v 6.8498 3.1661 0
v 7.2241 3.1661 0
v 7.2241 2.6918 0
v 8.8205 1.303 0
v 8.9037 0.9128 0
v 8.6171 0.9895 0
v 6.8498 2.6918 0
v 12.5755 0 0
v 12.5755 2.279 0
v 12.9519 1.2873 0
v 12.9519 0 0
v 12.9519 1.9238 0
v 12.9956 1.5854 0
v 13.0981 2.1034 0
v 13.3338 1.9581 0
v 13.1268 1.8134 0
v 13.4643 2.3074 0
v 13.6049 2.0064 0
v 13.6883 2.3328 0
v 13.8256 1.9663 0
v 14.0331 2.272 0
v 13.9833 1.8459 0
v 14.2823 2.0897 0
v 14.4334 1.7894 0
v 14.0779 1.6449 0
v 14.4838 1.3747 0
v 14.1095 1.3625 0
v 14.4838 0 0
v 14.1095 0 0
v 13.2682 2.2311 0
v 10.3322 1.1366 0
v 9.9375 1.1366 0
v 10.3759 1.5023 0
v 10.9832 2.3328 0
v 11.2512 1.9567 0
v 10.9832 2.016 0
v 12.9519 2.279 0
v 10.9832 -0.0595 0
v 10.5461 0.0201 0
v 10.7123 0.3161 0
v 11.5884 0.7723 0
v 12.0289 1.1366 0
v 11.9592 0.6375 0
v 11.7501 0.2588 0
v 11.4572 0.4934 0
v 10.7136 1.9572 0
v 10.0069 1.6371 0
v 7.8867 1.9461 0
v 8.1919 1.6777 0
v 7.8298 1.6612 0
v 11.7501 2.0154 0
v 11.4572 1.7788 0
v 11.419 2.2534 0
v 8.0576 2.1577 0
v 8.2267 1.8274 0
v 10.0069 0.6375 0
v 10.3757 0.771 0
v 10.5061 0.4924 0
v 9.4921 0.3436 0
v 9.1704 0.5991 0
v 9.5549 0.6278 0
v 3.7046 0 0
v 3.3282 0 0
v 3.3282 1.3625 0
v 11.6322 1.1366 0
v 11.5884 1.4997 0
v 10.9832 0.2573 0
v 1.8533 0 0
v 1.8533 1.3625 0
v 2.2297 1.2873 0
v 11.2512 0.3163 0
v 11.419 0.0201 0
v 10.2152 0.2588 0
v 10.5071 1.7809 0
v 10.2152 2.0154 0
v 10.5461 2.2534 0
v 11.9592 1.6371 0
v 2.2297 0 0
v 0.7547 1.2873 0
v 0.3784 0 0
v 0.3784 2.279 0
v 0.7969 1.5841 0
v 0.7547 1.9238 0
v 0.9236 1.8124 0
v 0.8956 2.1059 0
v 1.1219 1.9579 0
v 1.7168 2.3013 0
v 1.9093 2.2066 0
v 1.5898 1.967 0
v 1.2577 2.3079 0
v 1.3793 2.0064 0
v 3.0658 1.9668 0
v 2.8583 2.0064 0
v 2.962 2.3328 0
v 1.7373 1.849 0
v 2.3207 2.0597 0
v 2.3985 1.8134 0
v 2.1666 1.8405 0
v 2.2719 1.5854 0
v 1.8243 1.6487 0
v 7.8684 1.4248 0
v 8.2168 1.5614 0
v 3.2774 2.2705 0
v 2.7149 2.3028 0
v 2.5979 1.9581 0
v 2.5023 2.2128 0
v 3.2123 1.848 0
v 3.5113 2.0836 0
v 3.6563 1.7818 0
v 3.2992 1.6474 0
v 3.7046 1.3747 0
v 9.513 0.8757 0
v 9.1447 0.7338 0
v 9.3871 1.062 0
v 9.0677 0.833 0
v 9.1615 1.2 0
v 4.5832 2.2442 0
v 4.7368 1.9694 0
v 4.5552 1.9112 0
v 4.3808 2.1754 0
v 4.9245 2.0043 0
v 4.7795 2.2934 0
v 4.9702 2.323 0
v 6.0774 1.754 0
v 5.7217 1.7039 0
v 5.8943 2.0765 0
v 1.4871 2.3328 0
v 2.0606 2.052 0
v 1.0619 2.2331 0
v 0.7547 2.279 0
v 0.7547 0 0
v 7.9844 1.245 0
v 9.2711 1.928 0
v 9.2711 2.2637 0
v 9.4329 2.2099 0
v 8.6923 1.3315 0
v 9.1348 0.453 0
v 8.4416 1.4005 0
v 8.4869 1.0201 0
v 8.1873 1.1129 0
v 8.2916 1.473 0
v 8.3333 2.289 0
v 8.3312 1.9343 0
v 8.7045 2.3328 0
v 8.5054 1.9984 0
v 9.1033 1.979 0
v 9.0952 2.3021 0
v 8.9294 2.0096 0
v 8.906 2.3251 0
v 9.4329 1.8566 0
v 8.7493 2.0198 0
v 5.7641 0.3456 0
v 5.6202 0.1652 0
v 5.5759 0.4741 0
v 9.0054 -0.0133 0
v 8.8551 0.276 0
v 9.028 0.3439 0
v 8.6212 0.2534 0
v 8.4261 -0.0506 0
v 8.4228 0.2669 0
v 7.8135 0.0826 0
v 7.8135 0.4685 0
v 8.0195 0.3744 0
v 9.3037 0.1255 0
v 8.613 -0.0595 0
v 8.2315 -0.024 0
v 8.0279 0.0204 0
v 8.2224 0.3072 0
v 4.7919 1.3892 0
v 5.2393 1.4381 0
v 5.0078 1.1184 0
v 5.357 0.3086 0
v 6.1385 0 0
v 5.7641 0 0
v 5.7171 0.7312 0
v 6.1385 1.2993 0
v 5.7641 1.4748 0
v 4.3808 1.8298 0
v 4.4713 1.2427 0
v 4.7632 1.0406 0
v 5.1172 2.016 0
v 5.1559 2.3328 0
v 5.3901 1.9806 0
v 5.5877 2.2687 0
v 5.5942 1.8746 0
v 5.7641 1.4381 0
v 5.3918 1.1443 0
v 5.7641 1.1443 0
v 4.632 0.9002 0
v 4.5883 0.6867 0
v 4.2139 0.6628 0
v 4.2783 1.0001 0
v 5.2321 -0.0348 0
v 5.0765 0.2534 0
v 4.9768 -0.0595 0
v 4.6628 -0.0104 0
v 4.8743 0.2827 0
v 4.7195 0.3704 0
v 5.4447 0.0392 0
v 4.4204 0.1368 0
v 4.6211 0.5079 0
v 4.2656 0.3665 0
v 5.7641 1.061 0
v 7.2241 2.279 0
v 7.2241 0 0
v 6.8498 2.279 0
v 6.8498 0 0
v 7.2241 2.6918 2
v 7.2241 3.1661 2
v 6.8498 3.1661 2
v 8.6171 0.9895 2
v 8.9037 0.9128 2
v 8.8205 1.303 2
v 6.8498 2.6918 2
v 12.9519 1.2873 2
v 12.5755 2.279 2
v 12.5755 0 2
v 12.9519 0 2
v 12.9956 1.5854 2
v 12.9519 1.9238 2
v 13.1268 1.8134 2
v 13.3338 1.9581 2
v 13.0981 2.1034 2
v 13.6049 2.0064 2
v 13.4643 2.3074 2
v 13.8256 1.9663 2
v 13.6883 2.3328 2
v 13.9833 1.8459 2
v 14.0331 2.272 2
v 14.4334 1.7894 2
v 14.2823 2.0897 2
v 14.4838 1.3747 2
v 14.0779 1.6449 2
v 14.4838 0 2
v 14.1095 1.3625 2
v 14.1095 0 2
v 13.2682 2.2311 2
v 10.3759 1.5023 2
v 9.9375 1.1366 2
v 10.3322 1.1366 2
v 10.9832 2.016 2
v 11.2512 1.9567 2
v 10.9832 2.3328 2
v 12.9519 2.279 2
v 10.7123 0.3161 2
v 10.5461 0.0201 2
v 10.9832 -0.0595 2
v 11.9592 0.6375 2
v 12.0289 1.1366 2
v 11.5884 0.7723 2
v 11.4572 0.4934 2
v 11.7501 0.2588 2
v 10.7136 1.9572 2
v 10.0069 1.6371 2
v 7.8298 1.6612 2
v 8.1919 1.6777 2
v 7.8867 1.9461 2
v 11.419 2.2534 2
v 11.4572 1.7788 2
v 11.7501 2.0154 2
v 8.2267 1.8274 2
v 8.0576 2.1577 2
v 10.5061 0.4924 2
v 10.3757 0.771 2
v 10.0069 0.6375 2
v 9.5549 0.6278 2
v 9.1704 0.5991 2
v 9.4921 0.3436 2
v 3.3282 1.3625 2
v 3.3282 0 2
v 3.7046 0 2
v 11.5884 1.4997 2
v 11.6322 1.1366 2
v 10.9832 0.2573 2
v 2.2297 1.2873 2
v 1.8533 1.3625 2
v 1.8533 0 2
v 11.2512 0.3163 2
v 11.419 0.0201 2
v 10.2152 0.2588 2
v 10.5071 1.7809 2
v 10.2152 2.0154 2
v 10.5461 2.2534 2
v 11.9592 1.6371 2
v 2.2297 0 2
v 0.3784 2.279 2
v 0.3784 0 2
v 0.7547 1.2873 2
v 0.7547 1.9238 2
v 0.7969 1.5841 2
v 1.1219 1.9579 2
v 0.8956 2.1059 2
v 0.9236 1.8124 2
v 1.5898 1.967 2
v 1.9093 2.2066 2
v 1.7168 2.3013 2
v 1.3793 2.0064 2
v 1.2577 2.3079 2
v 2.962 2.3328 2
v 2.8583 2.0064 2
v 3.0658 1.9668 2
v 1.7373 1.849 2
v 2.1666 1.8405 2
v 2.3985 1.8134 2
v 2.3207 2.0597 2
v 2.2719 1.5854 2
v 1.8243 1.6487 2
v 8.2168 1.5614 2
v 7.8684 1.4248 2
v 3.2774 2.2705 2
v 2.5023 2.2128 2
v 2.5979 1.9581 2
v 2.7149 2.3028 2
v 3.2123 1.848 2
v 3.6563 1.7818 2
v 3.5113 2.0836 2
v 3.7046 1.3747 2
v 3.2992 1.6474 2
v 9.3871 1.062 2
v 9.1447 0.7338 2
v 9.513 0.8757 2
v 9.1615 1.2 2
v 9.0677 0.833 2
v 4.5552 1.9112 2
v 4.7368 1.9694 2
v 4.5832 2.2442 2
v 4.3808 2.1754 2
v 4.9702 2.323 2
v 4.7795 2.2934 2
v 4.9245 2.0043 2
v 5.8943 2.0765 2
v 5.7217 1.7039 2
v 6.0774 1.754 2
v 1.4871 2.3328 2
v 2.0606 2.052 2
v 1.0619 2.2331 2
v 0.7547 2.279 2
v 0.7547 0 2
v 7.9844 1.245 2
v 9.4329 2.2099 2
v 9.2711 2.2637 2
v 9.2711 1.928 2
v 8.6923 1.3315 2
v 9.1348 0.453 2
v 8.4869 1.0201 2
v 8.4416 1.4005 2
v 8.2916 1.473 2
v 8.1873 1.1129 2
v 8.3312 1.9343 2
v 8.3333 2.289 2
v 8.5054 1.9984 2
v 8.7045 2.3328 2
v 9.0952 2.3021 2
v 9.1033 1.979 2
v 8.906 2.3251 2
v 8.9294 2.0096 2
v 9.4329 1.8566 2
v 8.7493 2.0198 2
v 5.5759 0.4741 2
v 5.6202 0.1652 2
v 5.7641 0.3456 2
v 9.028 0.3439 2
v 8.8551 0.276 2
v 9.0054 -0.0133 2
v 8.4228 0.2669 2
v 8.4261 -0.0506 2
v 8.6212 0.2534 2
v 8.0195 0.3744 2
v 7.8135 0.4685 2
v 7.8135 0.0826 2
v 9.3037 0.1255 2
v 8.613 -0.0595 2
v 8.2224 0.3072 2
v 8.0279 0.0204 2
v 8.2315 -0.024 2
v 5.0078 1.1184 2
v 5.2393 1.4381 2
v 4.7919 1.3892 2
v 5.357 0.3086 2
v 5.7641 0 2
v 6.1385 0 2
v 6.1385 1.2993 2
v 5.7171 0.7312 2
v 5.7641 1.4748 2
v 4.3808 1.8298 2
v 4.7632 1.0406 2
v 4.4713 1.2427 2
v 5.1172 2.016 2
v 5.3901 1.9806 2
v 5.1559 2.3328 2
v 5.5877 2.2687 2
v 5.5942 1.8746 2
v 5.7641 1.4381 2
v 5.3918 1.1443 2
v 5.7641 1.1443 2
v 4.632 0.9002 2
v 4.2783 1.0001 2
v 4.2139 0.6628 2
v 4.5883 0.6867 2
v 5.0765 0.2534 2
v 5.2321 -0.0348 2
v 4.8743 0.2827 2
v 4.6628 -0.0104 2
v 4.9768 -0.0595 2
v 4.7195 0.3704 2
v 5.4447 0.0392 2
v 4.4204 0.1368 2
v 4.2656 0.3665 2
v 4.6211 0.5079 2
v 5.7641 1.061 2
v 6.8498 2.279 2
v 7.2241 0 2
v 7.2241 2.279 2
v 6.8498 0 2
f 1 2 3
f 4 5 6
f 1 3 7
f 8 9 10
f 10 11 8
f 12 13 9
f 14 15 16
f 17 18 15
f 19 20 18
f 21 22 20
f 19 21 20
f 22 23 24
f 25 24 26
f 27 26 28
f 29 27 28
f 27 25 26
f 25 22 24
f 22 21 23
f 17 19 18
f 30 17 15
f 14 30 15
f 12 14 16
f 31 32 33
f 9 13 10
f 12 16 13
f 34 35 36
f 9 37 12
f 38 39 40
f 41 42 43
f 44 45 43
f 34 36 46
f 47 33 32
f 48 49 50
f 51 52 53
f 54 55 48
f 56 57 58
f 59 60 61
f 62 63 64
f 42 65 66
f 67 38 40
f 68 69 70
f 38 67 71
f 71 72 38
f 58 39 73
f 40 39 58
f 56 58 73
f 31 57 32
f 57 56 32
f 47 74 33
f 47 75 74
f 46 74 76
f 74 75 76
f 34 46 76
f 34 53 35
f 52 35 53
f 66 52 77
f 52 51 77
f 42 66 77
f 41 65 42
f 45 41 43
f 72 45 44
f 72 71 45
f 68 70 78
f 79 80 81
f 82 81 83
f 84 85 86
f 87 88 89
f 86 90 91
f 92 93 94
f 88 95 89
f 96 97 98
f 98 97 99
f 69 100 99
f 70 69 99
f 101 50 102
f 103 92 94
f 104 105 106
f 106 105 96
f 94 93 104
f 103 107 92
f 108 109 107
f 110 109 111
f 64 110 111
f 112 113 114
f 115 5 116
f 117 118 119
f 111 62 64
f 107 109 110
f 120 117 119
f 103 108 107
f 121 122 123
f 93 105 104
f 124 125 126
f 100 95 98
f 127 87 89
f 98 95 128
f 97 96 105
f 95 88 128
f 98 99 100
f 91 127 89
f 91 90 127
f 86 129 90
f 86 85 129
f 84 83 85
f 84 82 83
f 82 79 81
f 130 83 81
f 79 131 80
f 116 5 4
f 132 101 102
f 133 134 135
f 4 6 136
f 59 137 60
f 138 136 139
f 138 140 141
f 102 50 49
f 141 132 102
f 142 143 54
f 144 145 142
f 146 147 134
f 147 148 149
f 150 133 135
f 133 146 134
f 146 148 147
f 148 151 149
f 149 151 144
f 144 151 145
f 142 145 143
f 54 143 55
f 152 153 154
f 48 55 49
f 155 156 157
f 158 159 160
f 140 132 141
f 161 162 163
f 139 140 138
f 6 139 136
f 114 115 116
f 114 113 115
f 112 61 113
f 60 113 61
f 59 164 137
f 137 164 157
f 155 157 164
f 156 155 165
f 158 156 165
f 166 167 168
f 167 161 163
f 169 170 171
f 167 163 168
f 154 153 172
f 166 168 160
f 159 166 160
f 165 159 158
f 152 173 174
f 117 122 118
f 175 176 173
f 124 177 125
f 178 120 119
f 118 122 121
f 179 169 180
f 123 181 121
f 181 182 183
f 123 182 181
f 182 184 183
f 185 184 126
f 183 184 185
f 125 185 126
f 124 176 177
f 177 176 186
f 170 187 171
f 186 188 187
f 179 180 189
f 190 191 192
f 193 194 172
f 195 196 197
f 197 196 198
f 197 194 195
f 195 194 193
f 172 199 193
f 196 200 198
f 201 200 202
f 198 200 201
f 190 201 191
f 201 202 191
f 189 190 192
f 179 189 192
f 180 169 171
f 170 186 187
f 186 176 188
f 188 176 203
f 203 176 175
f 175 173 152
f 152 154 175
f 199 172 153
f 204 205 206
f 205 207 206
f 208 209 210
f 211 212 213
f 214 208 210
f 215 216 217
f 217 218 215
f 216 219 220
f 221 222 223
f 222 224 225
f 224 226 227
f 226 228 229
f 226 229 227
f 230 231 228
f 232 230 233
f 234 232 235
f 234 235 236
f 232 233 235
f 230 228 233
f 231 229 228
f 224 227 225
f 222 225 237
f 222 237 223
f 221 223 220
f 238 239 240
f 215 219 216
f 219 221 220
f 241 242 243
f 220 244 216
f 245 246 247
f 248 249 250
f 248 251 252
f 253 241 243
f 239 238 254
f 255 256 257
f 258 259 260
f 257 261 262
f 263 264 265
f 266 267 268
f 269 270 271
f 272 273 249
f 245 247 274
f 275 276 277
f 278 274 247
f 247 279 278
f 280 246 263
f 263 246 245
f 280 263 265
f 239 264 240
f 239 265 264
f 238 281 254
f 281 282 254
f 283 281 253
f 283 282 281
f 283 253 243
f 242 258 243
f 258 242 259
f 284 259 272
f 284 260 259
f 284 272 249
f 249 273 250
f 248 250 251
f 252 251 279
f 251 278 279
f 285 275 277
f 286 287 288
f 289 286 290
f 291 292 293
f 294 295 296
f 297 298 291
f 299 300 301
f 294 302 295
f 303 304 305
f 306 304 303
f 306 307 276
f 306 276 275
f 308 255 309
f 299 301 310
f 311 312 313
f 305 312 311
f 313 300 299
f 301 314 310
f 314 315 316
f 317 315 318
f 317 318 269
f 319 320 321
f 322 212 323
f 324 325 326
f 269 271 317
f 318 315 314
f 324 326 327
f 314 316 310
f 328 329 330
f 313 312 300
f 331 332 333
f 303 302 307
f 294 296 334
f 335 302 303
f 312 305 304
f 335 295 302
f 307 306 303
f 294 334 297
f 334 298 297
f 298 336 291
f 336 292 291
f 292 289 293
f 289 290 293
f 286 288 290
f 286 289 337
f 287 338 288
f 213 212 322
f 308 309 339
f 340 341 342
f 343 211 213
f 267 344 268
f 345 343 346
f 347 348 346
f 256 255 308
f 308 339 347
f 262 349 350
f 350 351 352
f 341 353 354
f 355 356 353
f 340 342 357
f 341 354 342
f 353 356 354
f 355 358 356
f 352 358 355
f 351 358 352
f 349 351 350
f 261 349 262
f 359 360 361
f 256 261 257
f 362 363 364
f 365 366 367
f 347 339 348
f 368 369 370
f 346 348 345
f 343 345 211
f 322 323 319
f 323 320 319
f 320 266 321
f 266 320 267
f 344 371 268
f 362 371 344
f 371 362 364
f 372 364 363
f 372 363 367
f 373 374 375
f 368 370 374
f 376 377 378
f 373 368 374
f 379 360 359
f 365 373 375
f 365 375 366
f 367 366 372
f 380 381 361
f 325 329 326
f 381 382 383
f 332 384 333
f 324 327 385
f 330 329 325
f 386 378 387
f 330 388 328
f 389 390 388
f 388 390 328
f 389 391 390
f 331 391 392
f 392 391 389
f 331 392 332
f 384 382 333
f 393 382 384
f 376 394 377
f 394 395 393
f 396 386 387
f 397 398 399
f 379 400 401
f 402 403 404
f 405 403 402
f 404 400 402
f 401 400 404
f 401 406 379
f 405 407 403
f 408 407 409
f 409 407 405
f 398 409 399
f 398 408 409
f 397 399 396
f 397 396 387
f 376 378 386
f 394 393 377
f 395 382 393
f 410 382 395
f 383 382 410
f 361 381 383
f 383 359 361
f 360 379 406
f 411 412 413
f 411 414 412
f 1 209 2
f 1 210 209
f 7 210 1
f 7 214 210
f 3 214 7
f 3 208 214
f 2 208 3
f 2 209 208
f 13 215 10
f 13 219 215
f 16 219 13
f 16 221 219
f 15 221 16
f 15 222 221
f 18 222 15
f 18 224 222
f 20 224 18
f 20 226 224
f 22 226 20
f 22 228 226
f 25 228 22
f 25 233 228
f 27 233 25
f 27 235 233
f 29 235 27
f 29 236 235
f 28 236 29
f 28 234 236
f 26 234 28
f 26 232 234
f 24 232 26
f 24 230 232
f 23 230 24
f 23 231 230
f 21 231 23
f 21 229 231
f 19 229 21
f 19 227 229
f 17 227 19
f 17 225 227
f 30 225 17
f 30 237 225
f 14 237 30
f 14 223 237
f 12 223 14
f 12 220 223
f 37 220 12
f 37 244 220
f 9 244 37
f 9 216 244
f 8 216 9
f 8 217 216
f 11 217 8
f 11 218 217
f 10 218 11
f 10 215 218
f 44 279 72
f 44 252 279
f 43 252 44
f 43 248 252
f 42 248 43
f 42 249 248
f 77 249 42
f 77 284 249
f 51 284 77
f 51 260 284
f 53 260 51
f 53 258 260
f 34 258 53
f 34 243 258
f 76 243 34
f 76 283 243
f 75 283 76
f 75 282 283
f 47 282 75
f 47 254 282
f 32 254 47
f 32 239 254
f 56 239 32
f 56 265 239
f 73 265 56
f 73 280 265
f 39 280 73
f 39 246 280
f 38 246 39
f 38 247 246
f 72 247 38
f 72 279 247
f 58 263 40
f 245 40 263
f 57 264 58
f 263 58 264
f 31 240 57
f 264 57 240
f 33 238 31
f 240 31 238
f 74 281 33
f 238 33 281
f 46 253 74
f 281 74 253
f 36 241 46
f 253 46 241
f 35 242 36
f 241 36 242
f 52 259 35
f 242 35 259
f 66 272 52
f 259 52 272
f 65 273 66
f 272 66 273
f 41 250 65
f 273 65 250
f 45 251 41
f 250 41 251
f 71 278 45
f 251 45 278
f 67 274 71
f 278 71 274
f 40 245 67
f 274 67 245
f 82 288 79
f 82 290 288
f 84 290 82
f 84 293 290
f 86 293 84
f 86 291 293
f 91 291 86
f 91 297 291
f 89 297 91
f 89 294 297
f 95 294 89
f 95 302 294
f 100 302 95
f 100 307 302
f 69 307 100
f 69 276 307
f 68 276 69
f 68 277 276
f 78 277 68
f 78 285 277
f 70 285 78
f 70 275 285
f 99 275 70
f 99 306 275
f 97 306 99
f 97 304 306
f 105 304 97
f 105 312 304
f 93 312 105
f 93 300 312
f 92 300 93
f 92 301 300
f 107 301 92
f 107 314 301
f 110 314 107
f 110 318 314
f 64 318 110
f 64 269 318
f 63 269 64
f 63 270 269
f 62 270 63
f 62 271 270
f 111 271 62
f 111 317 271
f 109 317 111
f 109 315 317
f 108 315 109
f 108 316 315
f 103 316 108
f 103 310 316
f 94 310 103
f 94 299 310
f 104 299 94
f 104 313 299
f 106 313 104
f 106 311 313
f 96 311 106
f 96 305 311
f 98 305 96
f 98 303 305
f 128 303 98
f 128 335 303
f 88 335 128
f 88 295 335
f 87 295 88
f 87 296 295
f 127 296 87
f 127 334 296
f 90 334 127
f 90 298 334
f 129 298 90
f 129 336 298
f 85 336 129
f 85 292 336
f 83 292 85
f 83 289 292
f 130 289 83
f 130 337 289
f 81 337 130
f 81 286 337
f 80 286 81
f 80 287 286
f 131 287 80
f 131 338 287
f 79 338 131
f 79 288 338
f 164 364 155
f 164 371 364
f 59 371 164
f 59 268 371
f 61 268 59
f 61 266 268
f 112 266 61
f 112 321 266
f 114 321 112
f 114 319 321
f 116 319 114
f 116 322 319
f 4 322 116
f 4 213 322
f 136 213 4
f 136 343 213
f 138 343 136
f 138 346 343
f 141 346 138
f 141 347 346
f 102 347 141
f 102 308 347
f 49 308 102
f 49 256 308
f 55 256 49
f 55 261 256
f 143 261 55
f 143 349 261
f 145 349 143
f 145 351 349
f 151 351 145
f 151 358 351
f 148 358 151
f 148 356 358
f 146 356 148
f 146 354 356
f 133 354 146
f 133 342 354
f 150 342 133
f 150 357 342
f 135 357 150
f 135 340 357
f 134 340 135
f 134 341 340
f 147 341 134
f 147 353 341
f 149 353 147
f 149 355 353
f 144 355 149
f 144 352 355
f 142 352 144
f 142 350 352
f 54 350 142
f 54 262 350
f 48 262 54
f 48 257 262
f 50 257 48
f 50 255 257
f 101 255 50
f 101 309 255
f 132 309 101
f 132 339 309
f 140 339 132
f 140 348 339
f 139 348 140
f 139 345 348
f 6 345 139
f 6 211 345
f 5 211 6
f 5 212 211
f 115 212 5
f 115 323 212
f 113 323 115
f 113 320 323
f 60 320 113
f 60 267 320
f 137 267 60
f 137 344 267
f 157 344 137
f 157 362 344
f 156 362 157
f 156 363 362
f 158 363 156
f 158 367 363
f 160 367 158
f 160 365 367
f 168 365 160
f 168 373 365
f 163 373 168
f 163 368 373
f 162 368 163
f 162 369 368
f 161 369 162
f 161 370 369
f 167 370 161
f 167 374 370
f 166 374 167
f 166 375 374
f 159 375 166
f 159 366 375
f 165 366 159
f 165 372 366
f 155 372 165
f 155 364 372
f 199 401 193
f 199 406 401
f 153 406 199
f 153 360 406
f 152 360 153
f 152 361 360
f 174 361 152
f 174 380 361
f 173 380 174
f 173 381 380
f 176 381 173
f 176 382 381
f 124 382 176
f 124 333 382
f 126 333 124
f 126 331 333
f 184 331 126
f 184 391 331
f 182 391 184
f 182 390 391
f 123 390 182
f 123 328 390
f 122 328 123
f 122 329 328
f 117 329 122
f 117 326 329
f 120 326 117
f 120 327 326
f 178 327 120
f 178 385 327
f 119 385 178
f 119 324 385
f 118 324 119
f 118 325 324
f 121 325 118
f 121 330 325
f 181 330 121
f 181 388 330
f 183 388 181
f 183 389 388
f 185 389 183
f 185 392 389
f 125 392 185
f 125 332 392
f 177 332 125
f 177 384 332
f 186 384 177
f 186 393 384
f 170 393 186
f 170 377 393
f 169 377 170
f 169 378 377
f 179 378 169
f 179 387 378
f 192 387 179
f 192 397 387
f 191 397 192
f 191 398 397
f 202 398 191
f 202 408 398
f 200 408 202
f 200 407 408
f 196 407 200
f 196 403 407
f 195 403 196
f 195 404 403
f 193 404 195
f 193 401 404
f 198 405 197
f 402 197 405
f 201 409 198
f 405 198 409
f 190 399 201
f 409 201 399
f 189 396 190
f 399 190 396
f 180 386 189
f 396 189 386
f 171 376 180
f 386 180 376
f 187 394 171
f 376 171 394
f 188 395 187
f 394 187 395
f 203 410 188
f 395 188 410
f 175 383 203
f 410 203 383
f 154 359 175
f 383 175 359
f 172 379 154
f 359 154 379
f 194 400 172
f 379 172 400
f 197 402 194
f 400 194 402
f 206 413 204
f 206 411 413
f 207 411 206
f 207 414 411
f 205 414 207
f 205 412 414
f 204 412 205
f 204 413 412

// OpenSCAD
texte_a_inserer = "maison"; 
taille = 3; 
police = "DejaVuSans"; //[[Abril Fatface,Aclonica,Acme,Advent Pro,Akronim,Aladin,Alegreya,Alegreya Sans,Alegreya SC,Alex Brush,Alfa Slab One,Alice,Amaranth,Architects Daughter,Archivo Black,Archivo Narrow,Arimo,Arvo,Asap,Astloch,Asul,Averia Libre,Averia Serif Libre,Bangers,Basic,Belgrano,Berkshire Swash,Bigshot One,Bilbo Swash Caps,Black Ops One,Bonbon,Bowlby One SC,Brawler,Bubblegum Sans,Butterfly Kids,Cabin Condensed,Caesar Dressing,Cagliostro,Calligraffitti,Capriola,Carter One,Changa One,Chango,Chelsea Market,Cherry Cream Soda,Chewy,Chicle,Chivo,Clicker Script,Coming Soon,Concert One,Condiment,Cookie,Courgette,Covered By Your Grace,Crimson Text,Dancing Script,DejaVu Sans,DejaVu Serif,Dhurjati,Doppio One,Dosis,Droid Sans,Eagle Lake,Electrolize,Emilys Candy,Encode Sans,Encode Sans Compressed,Euphoria Script,Exo,Exo 2,Faster One,Federo,Finger Paint,Fjord One,Fontdiner Swanky,Freckle Face,Fruktur,Gabriela,Geo,Germania One,Give You Glory,Gloria Hallelujah,Goudy Bookletter 1911,Graduate,Grand Hotel,Great Vibes,Griffy,Hanalei Fill,Happy Monkey,Henny Penny,Hind,IM Fell English SC,Indie Flower,Irish Grover,Italianno,Jacques Francois Shadow,Jolly Lodger,Josefin Slab,Joti One,Judson,Just Another Hand,Kalam,Kameron,Karma,Kavoon,Knewave,Kranky,Kristi,Laila,Lakki Reddy,Lancelot,Lato,Leckerli One,Ledger,Lekton,Lemon One,Liberation Sans,Libre Caslon Text,Life Savers,Lilita One,Lily Script One,Limelight,Lobster,Lobster Two,Londrina Outline,Londrina Shadow,Londrina Solid,Lora,Love Ya Like A Sister,Loved by the King,Lovers Quarrel,Luckiest Guy,Lusitana,Macondo,Macondo Swash Caps,Mako,Marck Script,Margarine,Marko One,Maven Pro,McLaren,MedievalSharp,Merienda One,Merriweather,Mervale Script,Metal Mania,Metrophobic,Milonga,Miltonian Tattoo,Miss Fajardose,Molle,Montez,Montserrat,Mr De Haviland,Mystery Quest,Neucha,New Rocker,Niconne,Nosifer,Nothing You Could Do,Noto Sans Oriya,Noto Serif,Nova Square,Nunito,Old Standard TT,Oleo Script,Oleo Script Swash Caps,Orbitron,Oregano,Orienta,Original Surfer,Oswald,Over the Rainbow,Overlock,Oxygen,Pacifico,Paprika,Parisienne,Patrick Hand SC,Paytone One,Peralta,Permanent Marker,Piedra,Pirata One,Play,Playball,Poetsen One,Poppins,Press Start 2P,Princess Sofia,PT Mono,Qwigley,Racing Sans One,Raleway,Rancho,Ranga,Ribeye,Roboto,Roboto Condensed,Roboto Slab,Rochester,Rock Salt,Rubik One,Sail,Salsa,Sansita One,Sarina,Satisfy,Schoolbell,Seaweed Script,Sevillana,Shadows Into Light,Shadows Into Light Two,Share,Six Caps,Skranji,Source Sans Pro,Spicy Rice,Stardos Stencil,Stoke,Syncopate,Teko,Terminal Dosis,The Girl Next Door,Tillana,Timmana,Titillium Web,Ubuntu,Ultra,Underdog,UnifrakturCook,UnifrakturMaguntia,Vampiro One,Vidaloka,Viga,Voces,Volkhov,Vollkorn,Voltaire,Waiting for the Sunrise,Wallpoet,Wellfleet,Wendy One,Yellowtail,Yesteryear,Zeyada]]
hauteur = 2; 
module rendu(){
linear_extrude(hauteur) text(texte_a_inserer,size = taille, font = police);
}
rendu();
 
